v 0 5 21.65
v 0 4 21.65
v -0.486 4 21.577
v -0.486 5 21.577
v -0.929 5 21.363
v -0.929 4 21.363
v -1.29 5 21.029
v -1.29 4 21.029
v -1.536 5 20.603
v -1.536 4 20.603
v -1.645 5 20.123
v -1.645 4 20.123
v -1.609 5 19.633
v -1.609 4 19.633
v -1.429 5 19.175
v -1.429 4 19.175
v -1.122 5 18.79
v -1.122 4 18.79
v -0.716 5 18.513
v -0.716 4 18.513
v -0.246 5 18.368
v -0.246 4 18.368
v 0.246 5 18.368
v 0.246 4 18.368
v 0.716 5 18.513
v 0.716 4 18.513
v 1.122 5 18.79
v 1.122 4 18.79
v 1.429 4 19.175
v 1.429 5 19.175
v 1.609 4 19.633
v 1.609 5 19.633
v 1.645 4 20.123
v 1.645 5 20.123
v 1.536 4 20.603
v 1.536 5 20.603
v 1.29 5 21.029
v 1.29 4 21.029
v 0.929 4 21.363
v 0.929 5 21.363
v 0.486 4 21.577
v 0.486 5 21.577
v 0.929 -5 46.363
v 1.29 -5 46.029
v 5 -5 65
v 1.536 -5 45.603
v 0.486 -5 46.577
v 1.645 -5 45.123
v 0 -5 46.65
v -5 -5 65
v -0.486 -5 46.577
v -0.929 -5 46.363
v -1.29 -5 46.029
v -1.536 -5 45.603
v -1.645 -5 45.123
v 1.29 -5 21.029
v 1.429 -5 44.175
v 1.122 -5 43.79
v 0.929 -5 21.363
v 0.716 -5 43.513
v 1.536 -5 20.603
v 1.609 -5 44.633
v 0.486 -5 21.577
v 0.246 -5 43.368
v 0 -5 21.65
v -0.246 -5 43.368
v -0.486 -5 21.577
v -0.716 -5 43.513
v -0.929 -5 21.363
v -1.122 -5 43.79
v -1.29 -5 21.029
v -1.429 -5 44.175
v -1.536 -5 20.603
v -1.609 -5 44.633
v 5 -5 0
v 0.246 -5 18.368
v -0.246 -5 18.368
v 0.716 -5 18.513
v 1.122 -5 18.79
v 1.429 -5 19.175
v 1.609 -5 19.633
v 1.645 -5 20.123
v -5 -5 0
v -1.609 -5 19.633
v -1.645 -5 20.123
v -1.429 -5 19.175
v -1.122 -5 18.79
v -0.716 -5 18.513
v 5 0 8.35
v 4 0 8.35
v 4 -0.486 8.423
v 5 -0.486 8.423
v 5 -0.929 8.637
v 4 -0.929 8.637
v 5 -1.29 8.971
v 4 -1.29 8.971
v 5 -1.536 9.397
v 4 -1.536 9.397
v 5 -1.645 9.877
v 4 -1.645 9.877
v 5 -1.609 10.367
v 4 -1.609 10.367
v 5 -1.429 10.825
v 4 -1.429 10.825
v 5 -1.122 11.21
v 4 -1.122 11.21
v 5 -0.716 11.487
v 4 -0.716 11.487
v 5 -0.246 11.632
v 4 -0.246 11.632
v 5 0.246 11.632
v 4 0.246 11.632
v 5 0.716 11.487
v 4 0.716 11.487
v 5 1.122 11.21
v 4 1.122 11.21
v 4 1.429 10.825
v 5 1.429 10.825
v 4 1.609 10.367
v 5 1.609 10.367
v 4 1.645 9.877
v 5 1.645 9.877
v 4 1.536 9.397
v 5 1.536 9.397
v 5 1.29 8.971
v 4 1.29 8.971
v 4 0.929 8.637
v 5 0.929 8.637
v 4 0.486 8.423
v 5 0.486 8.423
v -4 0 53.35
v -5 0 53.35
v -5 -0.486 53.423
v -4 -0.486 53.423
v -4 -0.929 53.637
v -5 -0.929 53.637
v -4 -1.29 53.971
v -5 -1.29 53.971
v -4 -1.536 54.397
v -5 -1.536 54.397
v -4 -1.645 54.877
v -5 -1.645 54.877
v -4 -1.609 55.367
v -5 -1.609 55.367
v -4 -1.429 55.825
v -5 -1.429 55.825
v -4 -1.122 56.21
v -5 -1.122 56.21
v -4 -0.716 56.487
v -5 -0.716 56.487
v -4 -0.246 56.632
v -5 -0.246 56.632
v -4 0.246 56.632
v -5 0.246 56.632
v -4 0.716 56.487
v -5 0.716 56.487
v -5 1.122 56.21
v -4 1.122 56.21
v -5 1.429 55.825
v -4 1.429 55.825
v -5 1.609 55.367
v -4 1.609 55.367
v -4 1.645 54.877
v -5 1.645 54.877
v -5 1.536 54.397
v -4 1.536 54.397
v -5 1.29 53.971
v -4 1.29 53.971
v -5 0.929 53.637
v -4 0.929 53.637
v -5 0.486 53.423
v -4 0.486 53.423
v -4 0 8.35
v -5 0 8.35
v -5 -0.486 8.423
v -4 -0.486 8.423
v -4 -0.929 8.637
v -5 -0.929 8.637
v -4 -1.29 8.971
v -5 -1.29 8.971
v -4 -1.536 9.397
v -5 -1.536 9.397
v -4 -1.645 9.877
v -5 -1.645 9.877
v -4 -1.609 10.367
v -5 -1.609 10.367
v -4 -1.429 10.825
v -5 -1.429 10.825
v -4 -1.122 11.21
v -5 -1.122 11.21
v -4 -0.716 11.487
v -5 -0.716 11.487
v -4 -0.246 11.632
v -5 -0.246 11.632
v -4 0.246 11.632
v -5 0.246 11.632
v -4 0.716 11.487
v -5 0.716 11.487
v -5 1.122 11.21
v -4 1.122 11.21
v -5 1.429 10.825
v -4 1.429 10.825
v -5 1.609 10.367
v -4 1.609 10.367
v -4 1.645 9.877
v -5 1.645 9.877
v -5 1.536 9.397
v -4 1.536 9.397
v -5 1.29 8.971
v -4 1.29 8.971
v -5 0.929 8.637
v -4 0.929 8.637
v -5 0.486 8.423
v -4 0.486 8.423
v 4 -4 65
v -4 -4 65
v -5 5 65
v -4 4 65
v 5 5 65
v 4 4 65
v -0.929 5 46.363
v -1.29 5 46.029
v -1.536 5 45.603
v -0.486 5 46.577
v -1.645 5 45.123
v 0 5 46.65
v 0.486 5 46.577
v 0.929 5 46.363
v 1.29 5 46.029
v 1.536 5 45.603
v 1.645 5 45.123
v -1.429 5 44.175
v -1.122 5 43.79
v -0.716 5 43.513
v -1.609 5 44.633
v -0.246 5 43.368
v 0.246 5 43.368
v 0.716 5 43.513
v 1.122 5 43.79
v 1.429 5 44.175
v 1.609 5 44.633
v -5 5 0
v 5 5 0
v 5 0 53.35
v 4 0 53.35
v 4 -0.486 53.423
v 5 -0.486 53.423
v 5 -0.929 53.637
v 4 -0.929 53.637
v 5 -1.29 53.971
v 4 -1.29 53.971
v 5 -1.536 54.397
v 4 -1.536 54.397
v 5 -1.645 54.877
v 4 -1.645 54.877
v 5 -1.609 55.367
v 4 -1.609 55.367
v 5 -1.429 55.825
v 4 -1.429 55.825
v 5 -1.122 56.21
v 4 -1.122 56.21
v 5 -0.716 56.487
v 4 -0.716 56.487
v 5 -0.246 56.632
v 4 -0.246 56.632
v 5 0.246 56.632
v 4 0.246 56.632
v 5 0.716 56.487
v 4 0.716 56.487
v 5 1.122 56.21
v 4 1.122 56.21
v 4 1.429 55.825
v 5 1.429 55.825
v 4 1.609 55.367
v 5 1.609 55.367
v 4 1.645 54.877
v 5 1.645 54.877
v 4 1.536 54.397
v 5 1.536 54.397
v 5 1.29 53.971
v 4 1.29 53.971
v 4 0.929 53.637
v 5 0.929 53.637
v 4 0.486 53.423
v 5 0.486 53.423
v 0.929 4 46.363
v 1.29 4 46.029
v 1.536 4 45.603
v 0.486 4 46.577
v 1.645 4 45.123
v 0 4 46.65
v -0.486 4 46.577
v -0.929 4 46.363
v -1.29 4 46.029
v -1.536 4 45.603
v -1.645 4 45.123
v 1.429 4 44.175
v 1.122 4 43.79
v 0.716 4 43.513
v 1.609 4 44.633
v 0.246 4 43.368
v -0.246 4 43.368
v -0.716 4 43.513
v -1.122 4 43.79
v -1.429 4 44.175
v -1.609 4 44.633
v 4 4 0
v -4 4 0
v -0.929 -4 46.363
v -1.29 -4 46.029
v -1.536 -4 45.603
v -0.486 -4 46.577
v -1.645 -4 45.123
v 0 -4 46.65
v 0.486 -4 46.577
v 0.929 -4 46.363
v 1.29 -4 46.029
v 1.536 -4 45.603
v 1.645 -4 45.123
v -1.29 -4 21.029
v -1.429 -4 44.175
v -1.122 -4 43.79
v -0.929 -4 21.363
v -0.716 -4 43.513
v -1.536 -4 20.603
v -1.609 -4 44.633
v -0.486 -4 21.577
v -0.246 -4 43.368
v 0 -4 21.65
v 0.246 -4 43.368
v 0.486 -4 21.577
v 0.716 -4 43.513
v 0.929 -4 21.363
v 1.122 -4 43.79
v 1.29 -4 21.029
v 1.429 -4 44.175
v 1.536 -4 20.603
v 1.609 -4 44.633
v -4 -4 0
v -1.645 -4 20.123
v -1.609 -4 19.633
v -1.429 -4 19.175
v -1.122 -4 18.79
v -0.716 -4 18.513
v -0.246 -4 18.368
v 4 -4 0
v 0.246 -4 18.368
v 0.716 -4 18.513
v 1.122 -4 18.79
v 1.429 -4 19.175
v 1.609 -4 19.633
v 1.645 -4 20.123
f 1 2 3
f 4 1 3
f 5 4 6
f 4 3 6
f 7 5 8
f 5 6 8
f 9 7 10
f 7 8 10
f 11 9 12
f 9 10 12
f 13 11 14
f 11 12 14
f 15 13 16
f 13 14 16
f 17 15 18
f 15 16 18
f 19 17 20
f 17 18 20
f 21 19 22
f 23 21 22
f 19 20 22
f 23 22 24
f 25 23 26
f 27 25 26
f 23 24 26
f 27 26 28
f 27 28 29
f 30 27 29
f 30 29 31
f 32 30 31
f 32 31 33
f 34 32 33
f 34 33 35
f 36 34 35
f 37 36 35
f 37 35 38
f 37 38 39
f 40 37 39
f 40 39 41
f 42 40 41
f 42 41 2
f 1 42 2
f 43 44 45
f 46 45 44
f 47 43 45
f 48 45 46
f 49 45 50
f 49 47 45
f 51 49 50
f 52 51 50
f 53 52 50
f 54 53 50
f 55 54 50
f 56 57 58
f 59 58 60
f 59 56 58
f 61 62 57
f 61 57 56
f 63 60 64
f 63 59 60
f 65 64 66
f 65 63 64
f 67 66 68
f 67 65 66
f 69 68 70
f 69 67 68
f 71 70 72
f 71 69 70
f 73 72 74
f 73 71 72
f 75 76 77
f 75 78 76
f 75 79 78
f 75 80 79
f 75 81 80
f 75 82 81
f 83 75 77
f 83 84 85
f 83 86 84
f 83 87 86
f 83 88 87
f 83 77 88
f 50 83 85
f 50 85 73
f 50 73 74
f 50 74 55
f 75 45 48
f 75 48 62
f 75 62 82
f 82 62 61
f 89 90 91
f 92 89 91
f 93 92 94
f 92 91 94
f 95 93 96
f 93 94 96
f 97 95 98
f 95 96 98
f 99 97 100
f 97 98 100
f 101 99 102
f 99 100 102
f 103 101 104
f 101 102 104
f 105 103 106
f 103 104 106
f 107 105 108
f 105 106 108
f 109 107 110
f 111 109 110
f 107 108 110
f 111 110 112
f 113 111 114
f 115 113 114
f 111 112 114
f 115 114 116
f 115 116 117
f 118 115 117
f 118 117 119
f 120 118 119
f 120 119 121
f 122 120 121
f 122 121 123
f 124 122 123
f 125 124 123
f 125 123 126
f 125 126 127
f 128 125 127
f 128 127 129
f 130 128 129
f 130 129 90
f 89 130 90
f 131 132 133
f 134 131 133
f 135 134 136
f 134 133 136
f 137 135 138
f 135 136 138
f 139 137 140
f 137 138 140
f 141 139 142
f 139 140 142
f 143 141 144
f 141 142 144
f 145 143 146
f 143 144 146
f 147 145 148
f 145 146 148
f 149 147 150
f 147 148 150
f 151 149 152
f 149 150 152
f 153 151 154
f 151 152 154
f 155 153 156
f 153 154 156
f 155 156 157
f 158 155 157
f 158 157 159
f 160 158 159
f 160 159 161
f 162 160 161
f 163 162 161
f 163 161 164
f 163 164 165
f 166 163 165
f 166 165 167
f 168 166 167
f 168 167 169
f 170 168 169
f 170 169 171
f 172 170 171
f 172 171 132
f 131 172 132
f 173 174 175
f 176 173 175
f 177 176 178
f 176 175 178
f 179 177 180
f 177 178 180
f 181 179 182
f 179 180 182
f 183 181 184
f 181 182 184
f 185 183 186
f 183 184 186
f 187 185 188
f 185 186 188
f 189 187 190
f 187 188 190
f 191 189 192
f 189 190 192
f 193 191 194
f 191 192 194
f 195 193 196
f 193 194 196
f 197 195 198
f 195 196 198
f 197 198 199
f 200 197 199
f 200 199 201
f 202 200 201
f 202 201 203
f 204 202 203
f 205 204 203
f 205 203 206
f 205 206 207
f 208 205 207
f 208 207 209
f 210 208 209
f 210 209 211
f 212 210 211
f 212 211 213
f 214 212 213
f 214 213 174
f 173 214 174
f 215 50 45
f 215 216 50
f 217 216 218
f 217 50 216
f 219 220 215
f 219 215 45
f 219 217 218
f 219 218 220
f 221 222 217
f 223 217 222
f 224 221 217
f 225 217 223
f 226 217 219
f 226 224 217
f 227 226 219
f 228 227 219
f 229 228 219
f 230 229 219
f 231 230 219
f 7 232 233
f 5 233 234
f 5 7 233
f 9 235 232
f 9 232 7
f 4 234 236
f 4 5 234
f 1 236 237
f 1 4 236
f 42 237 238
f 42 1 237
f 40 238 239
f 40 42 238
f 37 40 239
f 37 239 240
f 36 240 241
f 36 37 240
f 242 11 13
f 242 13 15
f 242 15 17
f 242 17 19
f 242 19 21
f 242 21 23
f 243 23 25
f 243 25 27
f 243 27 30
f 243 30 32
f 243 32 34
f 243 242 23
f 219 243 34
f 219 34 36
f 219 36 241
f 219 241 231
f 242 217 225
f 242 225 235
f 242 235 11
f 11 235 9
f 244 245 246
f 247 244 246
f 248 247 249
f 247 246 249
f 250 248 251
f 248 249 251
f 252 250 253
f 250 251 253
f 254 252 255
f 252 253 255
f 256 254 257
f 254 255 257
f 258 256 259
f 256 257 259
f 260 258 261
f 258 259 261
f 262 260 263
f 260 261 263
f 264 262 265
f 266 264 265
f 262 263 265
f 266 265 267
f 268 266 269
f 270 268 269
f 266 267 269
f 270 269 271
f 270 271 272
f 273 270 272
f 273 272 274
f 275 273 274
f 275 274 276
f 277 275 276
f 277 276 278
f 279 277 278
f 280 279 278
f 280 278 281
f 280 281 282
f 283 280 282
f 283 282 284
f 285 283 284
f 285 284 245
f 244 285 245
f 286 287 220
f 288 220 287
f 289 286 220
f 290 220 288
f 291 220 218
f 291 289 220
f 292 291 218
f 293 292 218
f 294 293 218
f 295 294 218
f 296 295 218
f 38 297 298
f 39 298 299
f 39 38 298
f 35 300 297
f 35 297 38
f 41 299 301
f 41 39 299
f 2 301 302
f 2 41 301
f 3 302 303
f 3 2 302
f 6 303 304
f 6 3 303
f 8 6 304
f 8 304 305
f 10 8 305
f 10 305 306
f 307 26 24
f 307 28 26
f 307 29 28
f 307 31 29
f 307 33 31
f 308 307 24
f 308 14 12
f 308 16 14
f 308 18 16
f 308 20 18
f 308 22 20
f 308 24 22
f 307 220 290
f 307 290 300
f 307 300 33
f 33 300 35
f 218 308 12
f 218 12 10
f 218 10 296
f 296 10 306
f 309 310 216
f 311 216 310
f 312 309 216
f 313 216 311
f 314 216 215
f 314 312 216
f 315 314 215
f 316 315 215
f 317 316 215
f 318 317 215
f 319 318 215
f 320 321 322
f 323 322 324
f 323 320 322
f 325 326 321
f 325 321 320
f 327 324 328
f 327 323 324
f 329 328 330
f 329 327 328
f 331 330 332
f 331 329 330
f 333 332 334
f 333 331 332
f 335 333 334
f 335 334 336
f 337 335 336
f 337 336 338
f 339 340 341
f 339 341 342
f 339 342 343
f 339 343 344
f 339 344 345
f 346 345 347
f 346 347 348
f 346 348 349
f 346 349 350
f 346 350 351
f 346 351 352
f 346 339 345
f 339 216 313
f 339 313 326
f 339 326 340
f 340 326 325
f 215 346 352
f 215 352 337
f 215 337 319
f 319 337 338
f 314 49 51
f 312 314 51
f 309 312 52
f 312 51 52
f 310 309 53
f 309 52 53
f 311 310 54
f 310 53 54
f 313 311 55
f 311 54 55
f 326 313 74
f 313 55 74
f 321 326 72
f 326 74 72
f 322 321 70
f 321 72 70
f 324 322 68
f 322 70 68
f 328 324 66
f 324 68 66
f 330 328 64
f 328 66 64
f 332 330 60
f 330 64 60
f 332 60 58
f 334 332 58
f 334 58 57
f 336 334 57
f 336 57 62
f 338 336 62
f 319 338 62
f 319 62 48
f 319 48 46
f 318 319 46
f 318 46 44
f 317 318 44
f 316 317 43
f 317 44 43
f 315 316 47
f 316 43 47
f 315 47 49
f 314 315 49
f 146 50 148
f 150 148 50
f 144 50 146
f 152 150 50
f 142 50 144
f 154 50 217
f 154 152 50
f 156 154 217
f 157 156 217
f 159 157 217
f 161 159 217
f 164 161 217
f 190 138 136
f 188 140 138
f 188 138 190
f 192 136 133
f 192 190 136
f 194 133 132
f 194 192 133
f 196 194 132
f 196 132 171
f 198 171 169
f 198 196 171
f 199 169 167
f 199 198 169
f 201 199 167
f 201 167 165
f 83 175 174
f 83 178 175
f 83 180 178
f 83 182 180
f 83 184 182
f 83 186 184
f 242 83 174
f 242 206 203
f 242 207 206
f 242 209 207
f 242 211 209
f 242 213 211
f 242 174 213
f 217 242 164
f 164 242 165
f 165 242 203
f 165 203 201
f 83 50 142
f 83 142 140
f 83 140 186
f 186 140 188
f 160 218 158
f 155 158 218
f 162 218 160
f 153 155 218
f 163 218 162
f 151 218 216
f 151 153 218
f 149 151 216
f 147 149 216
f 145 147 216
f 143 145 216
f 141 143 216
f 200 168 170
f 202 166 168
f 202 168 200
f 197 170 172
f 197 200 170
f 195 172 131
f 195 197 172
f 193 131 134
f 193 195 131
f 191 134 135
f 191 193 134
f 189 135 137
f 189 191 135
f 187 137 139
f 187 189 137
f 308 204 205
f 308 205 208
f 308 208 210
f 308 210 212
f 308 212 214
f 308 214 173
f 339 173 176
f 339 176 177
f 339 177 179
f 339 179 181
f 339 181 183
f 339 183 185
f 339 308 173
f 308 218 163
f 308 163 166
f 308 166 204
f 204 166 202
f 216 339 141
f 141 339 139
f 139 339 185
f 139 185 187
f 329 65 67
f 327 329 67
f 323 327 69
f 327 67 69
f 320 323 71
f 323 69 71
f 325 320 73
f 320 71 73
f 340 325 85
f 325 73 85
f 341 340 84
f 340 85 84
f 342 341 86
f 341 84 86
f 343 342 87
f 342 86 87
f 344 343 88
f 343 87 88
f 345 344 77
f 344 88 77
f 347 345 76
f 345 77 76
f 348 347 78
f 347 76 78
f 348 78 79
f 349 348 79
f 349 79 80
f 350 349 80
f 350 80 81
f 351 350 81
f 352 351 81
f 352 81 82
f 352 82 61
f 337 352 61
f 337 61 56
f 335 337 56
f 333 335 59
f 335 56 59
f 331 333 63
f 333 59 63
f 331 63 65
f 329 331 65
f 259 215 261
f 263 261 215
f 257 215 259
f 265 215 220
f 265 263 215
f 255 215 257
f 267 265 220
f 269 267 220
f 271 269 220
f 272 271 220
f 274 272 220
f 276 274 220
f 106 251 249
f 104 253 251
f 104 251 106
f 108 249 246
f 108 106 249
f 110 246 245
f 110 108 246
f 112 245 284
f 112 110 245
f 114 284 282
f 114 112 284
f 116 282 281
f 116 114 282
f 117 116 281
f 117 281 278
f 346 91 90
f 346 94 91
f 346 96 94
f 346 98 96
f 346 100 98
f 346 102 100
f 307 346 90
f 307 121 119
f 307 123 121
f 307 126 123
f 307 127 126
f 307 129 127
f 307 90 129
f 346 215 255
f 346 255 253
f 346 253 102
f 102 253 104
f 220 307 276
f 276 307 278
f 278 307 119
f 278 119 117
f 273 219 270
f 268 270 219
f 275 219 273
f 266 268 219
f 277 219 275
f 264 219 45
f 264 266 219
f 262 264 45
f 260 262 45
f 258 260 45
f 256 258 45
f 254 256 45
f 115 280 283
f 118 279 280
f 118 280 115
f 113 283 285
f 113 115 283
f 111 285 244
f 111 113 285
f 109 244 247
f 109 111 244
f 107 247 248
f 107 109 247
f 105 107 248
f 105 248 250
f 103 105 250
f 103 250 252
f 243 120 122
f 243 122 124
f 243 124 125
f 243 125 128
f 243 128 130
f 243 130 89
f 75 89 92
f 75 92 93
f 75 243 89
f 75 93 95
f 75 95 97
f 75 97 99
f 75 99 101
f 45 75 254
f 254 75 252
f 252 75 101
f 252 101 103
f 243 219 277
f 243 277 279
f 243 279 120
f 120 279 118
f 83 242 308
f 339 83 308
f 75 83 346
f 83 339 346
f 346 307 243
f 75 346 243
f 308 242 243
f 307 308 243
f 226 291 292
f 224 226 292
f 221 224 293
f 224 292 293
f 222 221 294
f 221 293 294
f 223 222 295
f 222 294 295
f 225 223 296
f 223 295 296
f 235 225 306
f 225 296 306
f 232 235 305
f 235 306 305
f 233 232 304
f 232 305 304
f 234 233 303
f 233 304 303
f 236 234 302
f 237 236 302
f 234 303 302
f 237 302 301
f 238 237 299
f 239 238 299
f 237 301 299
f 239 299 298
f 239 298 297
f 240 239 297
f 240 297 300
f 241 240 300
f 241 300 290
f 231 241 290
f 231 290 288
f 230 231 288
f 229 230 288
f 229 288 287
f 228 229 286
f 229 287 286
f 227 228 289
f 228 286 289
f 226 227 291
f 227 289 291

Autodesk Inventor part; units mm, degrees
ref_plane "YZ Plane" through (0, 0, 0) normal (1, 0, 0) x (0, 1, 0)
ref_plane "XZ Plane" through (0, 0, 0) normal (0, 1, 0) x (-1, 0, 0)
ref_plane "XY Plane" through (0, 0, 0) normal (0, 0, 1) x (1, 0, 0)
sketch "スケッチ1" plane through (0, 0, 0) normal (0, 0, 1) x (1, 0, 0)
  line L0 (5, -5) -> (-5, -5)
  line L1 (-5, -5) -> (-5, 5)
  line L2 (-5, 5) -> (5, 5)
  line L3 (5, 5) -> (5, -5)
  line L4 (5, -5) -> (-5, 5) construction
  line L5 (-5, -5) -> (5, 5) construction
  line L6 (4, 4) -> (-4, 4)
  line L7 (-4, 4) -> (-4, -4)
  line L8 (-4, -4) -> (4, -4)
  line L9 (4, -4) -> (4, 4)
  point P0 (0, 0)
  dimension "d0" = 10
  dimension "d1" = 10
  dimension "d2" = 1
extrude "押し出し1" add sketch "スケッチ1" along normal blind 65
sketch "スケッチ2" plane through (5, -5, 0) normal (1, 0, 0) x (0, 0, -1)
  line L0 (0, 5) -> (-65, 5)
  line L1 (-65, 9) -> (-65, 1) projected
  line L2 (0, 0) -> (0, 10) projected
  point P0 (-55, 5)
  point P1 (-10, 5)
  dimension "d5" = 45
  dimension "d6" = 10
hole "穴1" at (5, 0, 55) at (5, 0, 10) direction (-1, 0, 0) diameter 3.3 end through all
sketch "スケッチ3" plane through (-5, 5, 0) normal (0, 1, 0) x (1, 0, 0)
  line L0 (5, 0) -> (5, -65)
  line L1 (1, -65) -> (9, -65) projected
  line L2 (10, 0) -> (0, 0) projected
  point P0 (5, -45)
  point P1 (5, -20)
  dimension "d14" = 20
  dimension "d15" = 25
hole "穴2" at (0, 5, 45) at (0, 5, 20) direction (0, -1, 0) diameter 3.3 end through all
properties part number "xxkaku_1010"
